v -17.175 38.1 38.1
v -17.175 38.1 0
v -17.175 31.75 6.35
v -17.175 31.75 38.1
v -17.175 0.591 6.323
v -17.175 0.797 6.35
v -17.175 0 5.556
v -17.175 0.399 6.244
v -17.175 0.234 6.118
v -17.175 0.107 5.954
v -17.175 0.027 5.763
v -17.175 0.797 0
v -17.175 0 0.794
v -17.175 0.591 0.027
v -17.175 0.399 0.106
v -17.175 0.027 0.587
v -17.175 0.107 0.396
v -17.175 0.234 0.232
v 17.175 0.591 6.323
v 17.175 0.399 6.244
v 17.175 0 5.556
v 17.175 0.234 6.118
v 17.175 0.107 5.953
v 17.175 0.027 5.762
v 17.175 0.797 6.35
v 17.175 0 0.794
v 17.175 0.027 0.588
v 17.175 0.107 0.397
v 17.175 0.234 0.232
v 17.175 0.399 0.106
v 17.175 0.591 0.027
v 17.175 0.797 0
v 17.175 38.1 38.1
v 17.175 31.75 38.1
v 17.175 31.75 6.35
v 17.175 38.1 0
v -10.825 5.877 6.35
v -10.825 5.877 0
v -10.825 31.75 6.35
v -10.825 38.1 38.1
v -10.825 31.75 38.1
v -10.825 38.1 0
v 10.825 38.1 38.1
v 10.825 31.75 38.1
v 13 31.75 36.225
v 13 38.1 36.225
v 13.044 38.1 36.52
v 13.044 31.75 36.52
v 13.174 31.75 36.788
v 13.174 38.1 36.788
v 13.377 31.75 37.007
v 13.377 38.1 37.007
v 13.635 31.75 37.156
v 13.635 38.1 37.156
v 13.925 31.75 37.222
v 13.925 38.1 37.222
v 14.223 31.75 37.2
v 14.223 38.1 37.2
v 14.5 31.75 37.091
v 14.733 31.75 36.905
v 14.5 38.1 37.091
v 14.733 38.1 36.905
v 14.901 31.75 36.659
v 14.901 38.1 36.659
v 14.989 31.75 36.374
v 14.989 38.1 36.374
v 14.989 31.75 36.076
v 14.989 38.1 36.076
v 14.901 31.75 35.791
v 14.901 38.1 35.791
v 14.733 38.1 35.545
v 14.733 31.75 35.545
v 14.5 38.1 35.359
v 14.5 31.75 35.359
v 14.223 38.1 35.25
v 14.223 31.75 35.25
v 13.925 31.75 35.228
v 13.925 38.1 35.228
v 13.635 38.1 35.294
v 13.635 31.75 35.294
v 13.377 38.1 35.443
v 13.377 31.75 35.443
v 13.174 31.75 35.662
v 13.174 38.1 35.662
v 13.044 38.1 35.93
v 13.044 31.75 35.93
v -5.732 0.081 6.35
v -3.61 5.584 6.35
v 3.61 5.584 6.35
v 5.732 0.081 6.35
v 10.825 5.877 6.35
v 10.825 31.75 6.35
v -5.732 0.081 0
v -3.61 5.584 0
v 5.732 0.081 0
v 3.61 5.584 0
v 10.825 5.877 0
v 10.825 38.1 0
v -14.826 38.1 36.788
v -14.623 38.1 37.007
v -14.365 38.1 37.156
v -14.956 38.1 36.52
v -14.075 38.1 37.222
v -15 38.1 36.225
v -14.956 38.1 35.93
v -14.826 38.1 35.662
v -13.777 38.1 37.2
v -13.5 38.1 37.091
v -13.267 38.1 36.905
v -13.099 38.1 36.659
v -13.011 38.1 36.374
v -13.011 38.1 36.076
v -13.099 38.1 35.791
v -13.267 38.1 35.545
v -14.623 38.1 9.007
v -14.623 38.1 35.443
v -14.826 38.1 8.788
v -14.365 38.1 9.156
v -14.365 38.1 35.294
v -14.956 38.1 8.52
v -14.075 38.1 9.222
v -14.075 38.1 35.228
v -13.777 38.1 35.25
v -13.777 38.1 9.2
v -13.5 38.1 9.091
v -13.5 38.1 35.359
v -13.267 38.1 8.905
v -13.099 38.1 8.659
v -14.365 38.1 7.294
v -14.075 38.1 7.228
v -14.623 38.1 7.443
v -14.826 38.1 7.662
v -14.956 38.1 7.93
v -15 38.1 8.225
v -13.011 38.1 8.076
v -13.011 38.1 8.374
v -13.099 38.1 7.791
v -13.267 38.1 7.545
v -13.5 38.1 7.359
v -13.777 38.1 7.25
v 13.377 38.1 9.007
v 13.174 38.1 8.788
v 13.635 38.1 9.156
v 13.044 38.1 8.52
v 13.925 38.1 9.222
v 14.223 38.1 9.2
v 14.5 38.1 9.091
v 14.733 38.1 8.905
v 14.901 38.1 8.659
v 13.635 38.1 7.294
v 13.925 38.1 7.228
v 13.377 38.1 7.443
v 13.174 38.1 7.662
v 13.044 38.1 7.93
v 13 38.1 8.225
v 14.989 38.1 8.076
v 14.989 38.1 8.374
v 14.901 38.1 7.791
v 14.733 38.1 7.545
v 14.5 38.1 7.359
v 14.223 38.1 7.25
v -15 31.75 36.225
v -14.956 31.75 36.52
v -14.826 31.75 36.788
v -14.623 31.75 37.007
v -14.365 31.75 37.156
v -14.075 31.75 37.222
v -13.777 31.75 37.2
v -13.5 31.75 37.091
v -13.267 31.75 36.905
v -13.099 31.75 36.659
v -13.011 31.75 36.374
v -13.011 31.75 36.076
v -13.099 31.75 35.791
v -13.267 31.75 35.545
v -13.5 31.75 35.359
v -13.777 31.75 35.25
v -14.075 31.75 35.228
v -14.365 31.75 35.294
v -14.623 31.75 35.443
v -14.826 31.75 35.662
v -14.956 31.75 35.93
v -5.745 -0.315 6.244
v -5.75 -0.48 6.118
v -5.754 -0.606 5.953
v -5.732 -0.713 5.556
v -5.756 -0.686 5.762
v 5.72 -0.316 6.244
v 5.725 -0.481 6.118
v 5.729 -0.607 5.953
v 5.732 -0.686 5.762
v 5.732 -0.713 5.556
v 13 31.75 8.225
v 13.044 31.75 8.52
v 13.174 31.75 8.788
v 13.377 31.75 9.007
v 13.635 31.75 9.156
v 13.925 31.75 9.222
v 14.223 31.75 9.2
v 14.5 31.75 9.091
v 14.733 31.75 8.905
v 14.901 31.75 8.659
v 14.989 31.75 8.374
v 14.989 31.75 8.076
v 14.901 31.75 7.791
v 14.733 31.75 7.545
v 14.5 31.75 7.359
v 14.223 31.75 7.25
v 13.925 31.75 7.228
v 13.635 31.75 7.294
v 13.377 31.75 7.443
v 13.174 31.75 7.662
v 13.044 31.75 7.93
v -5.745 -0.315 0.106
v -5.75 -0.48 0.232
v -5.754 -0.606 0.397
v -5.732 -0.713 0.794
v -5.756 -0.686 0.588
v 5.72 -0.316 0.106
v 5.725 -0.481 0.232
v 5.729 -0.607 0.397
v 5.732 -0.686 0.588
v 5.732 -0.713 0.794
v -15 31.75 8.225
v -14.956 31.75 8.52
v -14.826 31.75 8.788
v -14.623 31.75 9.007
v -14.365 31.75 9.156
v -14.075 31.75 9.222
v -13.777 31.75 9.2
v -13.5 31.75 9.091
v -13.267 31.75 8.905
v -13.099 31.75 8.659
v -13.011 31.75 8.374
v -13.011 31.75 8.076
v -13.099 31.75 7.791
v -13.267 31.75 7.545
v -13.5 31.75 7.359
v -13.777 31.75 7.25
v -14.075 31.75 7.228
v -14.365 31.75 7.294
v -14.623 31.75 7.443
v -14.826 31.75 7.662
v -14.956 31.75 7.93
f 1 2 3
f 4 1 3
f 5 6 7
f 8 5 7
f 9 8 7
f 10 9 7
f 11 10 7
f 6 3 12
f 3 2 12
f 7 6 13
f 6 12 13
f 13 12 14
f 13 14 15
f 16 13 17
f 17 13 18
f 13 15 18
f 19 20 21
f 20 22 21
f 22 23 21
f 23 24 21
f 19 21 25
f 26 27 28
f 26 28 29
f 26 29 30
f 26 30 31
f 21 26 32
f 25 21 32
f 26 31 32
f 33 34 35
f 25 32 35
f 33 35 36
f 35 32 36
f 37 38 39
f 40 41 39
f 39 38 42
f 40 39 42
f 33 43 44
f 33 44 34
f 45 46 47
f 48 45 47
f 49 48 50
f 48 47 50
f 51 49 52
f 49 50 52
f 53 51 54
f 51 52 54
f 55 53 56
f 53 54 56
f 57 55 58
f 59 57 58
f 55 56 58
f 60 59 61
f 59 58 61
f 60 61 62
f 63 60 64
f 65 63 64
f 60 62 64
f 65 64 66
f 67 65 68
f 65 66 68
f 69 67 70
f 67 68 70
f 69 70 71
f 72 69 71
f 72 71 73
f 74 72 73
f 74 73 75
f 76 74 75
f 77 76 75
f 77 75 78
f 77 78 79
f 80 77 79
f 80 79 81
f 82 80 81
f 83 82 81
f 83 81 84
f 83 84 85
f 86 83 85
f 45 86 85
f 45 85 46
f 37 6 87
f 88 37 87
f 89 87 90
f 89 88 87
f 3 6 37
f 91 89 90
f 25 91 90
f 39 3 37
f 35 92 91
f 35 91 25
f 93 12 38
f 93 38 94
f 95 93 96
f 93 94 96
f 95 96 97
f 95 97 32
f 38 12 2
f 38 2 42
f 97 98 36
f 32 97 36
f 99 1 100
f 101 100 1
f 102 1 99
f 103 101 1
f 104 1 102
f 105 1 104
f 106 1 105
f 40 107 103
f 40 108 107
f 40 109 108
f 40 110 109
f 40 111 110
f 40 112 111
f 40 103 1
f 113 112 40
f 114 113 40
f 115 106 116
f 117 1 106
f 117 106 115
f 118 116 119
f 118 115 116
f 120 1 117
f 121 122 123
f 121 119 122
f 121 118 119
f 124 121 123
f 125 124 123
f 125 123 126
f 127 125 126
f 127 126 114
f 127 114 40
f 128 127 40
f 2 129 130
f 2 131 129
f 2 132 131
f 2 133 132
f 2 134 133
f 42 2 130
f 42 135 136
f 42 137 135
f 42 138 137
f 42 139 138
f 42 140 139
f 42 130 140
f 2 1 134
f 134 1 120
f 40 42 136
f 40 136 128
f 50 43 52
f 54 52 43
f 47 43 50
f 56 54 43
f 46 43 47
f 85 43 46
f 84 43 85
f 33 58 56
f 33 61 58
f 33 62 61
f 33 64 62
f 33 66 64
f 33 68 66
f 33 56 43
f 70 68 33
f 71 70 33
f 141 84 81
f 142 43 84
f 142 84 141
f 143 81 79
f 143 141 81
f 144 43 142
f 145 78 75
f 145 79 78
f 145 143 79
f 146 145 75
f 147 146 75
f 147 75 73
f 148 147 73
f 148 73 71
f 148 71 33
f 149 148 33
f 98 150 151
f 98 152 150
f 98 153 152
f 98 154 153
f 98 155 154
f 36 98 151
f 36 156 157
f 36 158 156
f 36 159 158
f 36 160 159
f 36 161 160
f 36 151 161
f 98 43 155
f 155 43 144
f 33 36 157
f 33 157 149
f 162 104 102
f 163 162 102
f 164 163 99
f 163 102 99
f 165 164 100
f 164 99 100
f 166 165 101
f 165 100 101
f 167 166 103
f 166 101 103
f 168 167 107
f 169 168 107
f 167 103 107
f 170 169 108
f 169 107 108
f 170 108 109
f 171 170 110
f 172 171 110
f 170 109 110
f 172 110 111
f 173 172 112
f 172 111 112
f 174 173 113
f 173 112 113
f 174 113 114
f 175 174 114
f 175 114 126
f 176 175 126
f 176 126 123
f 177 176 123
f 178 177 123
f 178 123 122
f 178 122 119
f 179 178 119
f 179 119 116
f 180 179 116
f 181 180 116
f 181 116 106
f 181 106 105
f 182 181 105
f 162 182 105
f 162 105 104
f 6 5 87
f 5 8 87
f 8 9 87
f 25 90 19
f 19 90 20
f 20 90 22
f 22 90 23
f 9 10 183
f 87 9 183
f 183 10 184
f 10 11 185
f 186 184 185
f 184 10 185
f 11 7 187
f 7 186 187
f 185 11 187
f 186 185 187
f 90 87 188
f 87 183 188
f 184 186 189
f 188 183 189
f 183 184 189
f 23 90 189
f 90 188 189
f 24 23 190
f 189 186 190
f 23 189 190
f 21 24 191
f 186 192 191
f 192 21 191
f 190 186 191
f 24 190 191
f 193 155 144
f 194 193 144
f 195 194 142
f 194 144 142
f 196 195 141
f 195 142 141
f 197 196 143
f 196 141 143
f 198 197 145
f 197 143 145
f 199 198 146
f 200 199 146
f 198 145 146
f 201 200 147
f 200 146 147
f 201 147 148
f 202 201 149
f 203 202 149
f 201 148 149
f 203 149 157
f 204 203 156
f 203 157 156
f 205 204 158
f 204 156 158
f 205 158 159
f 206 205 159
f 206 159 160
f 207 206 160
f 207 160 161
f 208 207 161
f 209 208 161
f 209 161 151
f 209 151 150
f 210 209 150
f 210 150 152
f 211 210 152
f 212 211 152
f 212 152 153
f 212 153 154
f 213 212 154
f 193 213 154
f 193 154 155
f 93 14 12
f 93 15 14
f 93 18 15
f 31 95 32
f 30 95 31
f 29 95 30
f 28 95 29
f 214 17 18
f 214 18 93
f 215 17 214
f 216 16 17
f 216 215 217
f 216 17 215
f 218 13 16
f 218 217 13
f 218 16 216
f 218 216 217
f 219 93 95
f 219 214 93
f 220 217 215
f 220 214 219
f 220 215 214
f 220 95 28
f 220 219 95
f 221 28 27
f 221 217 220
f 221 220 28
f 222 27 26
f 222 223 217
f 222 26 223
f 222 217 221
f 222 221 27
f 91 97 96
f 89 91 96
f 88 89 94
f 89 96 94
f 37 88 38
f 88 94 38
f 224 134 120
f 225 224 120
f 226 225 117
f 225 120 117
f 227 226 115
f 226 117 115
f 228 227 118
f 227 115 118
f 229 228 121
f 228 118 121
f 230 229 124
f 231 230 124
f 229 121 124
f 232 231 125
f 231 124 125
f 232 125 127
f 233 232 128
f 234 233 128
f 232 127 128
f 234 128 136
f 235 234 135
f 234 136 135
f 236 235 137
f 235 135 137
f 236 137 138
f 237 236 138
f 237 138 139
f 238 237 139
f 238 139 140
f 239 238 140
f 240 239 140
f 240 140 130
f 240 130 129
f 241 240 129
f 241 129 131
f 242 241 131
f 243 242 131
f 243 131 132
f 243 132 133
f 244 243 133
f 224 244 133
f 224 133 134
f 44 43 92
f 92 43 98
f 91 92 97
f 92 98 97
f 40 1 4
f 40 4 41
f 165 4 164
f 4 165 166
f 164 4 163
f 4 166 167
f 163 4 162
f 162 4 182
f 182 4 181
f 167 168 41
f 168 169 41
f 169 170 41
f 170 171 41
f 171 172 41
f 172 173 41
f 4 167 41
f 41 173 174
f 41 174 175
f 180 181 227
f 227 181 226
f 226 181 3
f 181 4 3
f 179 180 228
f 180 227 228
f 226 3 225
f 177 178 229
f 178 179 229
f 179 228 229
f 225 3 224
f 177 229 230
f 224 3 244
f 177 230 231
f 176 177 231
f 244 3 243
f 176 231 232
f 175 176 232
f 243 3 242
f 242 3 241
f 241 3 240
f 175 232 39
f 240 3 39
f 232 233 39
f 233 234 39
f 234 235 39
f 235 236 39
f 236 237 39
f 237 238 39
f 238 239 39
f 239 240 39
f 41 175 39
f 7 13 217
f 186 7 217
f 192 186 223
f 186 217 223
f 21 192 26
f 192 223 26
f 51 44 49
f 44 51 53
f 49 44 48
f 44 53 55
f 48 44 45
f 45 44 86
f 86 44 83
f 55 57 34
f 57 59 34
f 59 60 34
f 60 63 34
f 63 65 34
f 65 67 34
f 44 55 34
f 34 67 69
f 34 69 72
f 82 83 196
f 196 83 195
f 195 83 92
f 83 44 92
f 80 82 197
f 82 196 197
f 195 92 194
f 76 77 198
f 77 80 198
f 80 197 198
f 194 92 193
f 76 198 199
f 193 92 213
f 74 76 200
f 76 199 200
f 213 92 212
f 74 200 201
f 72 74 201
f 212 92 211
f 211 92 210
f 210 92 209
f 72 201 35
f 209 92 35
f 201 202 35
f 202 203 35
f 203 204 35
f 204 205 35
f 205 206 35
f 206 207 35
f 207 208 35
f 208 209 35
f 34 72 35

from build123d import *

# Parameters (mm, degrees)
F0_W     = 6.35
F0_H     = 6.341725
F2_DEPTH = 6.35
F1_W     = 6.35
F1_H     = 6.35
F3_DEPTH = 38.1
F5_D     = 2
F6_R     = 0.79375


with BuildPart() as f2:
    # F0 (on Top) → F2 (new body)
    with BuildSketch(Plane.XY):
        with BuildLine():
            Line((-10.825, 5.877161), (-10.825, 0))
            Line((-10.825, 0), (-17.175, 0))
            ThreePointArc((-17.175, 0), (0, -0.802674), (17.175, 0))
            Line((17.175, 0), (10.825, 0))
            Line((10.825, 0), (10.825, 5.877161))
            ThreePointArc((10.825, 5.877161), (0, 5.547326), (-10.825, 5.877161))
        make_face()
        Polygon((-17.175, 0), (-10.825, 0), (-10.825, 5.877161), (-10.825, 31.758275), (-17.175, 31.758275), align=None)
        with Locations((-14, 34.929137)):
            Rectangle(F0_W, F0_H)
        Polygon((10.825, 0), (17.175, 0), (17.175, 31.758275), (10.825, 31.758275), (10.825, 5.877161), align=None)
        with Locations((14, 34.929137)):
            Rectangle(F0_W, F0_H)
    extrude(amount=F2_DEPTH)

    # F1 (on Top) → F3 (join)
    with BuildSketch(Plane.XY):
        with Locations((-14, 34.925)):
            Rectangle(F1_W, F1_H)
        with Locations((14, 34.925)):
            Rectangle(F1_W, F1_H)
    extrude(amount=F3_DEPTH)

    # F5 (through all)
    with Locations(Plane.XZ.offset(-31.75)):
        with Locations((-14, 36.225), (-14, 8.225), (14, 8.225), (14, 36.225)):
            Hole(F5_D / 2)

    # F6
    f6_edges = [f2.edges().sort_by_distance(p)[0] for p in [
        (0, -0.802674, 6.35),
        (0, -0.802674, 0),
    ]]
    fillet(f6_edges, radius=F6_R)


solid = f2.part
